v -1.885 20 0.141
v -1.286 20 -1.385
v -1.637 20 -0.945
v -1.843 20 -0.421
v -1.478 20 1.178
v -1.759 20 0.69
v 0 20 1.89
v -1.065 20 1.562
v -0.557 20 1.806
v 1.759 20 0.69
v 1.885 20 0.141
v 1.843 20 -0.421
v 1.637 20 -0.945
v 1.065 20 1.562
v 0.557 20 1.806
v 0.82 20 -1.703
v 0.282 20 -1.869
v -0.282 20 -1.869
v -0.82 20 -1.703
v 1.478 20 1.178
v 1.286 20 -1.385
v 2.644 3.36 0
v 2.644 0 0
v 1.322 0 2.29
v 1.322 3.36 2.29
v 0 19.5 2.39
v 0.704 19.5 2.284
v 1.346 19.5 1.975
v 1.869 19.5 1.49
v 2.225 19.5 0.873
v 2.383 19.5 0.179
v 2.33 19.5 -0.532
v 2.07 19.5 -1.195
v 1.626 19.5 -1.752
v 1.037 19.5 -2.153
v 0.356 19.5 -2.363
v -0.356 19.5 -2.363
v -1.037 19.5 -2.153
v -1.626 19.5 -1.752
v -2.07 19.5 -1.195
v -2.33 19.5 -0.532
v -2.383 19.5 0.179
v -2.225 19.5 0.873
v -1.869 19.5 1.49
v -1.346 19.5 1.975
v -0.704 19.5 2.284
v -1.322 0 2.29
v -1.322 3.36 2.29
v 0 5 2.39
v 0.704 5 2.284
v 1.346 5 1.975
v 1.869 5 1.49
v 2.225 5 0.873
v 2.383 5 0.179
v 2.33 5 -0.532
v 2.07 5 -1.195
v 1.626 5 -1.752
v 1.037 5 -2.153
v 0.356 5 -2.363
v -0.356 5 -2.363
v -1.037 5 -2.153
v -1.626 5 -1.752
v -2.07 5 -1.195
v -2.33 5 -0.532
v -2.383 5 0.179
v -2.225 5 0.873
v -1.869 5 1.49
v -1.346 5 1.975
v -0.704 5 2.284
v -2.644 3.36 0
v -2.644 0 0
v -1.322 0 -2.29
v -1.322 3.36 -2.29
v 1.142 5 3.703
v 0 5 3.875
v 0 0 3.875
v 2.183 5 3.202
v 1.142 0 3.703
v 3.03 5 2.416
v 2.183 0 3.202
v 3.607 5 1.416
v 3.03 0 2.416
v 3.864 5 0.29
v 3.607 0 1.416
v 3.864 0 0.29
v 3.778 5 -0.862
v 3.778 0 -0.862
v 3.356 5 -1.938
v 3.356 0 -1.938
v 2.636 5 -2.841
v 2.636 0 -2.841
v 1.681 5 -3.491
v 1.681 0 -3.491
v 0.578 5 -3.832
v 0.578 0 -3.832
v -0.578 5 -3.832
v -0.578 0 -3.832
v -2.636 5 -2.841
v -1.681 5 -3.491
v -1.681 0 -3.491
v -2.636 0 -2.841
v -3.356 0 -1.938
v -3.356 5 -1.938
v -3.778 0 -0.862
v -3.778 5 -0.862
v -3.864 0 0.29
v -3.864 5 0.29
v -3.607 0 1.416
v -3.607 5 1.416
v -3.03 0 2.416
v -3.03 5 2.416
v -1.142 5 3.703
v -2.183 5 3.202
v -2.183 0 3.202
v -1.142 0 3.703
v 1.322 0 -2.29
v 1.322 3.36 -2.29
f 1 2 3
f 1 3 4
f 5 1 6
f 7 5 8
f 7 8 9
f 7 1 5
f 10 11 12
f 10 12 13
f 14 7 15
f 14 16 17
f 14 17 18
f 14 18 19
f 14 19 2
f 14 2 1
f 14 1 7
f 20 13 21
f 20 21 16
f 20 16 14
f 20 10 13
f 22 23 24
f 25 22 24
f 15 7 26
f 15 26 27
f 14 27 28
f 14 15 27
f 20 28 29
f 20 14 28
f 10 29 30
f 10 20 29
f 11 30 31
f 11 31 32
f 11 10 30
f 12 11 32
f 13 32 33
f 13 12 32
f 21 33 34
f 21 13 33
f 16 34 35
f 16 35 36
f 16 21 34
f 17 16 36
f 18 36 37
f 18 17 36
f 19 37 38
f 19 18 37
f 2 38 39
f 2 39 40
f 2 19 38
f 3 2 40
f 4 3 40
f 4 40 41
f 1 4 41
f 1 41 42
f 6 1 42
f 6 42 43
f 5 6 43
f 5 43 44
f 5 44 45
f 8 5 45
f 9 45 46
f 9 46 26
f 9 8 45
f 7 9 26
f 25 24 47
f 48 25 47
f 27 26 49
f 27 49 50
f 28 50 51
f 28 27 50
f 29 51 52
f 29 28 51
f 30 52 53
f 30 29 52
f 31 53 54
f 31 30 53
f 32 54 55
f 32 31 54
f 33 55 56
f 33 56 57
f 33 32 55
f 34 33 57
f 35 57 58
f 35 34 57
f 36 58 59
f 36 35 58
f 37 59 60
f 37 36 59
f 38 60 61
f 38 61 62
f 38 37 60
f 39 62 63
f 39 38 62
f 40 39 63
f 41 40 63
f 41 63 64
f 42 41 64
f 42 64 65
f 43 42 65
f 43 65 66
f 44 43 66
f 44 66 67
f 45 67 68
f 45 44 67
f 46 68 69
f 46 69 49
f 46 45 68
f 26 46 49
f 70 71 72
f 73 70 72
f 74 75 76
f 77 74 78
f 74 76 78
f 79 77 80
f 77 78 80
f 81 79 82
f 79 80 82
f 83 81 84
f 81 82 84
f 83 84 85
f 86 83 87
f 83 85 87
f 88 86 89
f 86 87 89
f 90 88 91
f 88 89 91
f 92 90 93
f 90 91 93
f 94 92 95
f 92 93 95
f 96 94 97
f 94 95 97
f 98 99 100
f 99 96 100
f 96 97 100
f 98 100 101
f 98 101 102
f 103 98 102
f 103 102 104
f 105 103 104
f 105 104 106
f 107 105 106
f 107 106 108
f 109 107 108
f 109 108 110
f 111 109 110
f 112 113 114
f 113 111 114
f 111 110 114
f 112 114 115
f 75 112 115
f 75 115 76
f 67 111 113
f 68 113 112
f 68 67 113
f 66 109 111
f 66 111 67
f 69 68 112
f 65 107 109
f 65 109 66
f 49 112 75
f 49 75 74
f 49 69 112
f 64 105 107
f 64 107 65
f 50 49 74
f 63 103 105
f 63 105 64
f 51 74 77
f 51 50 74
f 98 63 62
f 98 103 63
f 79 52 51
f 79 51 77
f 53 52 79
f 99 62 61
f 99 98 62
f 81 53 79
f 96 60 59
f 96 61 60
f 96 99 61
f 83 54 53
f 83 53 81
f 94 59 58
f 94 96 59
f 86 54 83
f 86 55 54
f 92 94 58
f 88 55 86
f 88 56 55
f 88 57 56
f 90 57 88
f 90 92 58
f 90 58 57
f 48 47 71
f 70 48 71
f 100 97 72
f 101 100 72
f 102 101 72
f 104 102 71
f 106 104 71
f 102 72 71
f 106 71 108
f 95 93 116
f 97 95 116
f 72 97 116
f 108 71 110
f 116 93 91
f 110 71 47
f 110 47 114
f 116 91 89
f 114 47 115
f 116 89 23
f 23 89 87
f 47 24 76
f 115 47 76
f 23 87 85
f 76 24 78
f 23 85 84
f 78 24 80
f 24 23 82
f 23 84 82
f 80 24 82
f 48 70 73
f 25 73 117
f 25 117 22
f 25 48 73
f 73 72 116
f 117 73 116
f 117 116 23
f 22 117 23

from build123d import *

# Parameters (mm, degrees)
SKETCH1_R           = 3.875
BOSS_EXTRUDE1_DEPTH = 20
SKETCH2_OUTSIDE_W   = 14.312
SKETCH2_OUTSIDE_H   = 14.312
SKETCH2_OUTSIDE_R   = 2.39
CUT_EXTRUDE1_DEPTH  = 15
CHAMFER1_SIZE       = 0.5
CUT_EXTRUDE2_DEPTH  = 3.36


with BuildPart() as part:
    # Sketch1 → Boss-Extrude1 (new body)
    with BuildSketch(Plane(origin=(0, 0, 0), x_dir=(1, 0, 0), z_dir=(0, 1, 0))):
        Circle(SKETCH1_R)
    extrude(amount=BOSS_EXTRUDE1_DEPTH)

    # Sketch2 outside → Cut-Extrude1 (cut)
    with BuildSketch(Plane(origin=(0, 20, 0), x_dir=(1, 0, 0), z_dir=(0, 1, 0))):
        Rectangle(SKETCH2_OUTSIDE_W, SKETCH2_OUTSIDE_H)
        Circle(SKETCH2_OUTSIDE_R, mode=Mode.SUBTRACT)
    extrude(amount=-CUT_EXTRUDE1_DEPTH, mode=Mode.SUBTRACT)

    # Chamfer1
    chamfer1_edges = [part.edges().sort_by_distance(p)[0] for p in [
        (-2.39, 20, 0),
    ]]
    chamfer(chamfer1_edges, length=CHAMFER1_SIZE)

    # Sketch8 → Cut-Extrude2 (cut)
    with BuildSketch(Plane.XZ):
        Polygon((2.644264233, 0), (1.322132116, 2.29), (-1.322132116, 2.29), (-2.644264233, 0), (-1.322132116, -2.29), (1.322132116, -2.29), align=None)
    extrude(amount=-CUT_EXTRUDE2_DEPTH, mode=Mode.SUBTRACT)


solid = part.part
